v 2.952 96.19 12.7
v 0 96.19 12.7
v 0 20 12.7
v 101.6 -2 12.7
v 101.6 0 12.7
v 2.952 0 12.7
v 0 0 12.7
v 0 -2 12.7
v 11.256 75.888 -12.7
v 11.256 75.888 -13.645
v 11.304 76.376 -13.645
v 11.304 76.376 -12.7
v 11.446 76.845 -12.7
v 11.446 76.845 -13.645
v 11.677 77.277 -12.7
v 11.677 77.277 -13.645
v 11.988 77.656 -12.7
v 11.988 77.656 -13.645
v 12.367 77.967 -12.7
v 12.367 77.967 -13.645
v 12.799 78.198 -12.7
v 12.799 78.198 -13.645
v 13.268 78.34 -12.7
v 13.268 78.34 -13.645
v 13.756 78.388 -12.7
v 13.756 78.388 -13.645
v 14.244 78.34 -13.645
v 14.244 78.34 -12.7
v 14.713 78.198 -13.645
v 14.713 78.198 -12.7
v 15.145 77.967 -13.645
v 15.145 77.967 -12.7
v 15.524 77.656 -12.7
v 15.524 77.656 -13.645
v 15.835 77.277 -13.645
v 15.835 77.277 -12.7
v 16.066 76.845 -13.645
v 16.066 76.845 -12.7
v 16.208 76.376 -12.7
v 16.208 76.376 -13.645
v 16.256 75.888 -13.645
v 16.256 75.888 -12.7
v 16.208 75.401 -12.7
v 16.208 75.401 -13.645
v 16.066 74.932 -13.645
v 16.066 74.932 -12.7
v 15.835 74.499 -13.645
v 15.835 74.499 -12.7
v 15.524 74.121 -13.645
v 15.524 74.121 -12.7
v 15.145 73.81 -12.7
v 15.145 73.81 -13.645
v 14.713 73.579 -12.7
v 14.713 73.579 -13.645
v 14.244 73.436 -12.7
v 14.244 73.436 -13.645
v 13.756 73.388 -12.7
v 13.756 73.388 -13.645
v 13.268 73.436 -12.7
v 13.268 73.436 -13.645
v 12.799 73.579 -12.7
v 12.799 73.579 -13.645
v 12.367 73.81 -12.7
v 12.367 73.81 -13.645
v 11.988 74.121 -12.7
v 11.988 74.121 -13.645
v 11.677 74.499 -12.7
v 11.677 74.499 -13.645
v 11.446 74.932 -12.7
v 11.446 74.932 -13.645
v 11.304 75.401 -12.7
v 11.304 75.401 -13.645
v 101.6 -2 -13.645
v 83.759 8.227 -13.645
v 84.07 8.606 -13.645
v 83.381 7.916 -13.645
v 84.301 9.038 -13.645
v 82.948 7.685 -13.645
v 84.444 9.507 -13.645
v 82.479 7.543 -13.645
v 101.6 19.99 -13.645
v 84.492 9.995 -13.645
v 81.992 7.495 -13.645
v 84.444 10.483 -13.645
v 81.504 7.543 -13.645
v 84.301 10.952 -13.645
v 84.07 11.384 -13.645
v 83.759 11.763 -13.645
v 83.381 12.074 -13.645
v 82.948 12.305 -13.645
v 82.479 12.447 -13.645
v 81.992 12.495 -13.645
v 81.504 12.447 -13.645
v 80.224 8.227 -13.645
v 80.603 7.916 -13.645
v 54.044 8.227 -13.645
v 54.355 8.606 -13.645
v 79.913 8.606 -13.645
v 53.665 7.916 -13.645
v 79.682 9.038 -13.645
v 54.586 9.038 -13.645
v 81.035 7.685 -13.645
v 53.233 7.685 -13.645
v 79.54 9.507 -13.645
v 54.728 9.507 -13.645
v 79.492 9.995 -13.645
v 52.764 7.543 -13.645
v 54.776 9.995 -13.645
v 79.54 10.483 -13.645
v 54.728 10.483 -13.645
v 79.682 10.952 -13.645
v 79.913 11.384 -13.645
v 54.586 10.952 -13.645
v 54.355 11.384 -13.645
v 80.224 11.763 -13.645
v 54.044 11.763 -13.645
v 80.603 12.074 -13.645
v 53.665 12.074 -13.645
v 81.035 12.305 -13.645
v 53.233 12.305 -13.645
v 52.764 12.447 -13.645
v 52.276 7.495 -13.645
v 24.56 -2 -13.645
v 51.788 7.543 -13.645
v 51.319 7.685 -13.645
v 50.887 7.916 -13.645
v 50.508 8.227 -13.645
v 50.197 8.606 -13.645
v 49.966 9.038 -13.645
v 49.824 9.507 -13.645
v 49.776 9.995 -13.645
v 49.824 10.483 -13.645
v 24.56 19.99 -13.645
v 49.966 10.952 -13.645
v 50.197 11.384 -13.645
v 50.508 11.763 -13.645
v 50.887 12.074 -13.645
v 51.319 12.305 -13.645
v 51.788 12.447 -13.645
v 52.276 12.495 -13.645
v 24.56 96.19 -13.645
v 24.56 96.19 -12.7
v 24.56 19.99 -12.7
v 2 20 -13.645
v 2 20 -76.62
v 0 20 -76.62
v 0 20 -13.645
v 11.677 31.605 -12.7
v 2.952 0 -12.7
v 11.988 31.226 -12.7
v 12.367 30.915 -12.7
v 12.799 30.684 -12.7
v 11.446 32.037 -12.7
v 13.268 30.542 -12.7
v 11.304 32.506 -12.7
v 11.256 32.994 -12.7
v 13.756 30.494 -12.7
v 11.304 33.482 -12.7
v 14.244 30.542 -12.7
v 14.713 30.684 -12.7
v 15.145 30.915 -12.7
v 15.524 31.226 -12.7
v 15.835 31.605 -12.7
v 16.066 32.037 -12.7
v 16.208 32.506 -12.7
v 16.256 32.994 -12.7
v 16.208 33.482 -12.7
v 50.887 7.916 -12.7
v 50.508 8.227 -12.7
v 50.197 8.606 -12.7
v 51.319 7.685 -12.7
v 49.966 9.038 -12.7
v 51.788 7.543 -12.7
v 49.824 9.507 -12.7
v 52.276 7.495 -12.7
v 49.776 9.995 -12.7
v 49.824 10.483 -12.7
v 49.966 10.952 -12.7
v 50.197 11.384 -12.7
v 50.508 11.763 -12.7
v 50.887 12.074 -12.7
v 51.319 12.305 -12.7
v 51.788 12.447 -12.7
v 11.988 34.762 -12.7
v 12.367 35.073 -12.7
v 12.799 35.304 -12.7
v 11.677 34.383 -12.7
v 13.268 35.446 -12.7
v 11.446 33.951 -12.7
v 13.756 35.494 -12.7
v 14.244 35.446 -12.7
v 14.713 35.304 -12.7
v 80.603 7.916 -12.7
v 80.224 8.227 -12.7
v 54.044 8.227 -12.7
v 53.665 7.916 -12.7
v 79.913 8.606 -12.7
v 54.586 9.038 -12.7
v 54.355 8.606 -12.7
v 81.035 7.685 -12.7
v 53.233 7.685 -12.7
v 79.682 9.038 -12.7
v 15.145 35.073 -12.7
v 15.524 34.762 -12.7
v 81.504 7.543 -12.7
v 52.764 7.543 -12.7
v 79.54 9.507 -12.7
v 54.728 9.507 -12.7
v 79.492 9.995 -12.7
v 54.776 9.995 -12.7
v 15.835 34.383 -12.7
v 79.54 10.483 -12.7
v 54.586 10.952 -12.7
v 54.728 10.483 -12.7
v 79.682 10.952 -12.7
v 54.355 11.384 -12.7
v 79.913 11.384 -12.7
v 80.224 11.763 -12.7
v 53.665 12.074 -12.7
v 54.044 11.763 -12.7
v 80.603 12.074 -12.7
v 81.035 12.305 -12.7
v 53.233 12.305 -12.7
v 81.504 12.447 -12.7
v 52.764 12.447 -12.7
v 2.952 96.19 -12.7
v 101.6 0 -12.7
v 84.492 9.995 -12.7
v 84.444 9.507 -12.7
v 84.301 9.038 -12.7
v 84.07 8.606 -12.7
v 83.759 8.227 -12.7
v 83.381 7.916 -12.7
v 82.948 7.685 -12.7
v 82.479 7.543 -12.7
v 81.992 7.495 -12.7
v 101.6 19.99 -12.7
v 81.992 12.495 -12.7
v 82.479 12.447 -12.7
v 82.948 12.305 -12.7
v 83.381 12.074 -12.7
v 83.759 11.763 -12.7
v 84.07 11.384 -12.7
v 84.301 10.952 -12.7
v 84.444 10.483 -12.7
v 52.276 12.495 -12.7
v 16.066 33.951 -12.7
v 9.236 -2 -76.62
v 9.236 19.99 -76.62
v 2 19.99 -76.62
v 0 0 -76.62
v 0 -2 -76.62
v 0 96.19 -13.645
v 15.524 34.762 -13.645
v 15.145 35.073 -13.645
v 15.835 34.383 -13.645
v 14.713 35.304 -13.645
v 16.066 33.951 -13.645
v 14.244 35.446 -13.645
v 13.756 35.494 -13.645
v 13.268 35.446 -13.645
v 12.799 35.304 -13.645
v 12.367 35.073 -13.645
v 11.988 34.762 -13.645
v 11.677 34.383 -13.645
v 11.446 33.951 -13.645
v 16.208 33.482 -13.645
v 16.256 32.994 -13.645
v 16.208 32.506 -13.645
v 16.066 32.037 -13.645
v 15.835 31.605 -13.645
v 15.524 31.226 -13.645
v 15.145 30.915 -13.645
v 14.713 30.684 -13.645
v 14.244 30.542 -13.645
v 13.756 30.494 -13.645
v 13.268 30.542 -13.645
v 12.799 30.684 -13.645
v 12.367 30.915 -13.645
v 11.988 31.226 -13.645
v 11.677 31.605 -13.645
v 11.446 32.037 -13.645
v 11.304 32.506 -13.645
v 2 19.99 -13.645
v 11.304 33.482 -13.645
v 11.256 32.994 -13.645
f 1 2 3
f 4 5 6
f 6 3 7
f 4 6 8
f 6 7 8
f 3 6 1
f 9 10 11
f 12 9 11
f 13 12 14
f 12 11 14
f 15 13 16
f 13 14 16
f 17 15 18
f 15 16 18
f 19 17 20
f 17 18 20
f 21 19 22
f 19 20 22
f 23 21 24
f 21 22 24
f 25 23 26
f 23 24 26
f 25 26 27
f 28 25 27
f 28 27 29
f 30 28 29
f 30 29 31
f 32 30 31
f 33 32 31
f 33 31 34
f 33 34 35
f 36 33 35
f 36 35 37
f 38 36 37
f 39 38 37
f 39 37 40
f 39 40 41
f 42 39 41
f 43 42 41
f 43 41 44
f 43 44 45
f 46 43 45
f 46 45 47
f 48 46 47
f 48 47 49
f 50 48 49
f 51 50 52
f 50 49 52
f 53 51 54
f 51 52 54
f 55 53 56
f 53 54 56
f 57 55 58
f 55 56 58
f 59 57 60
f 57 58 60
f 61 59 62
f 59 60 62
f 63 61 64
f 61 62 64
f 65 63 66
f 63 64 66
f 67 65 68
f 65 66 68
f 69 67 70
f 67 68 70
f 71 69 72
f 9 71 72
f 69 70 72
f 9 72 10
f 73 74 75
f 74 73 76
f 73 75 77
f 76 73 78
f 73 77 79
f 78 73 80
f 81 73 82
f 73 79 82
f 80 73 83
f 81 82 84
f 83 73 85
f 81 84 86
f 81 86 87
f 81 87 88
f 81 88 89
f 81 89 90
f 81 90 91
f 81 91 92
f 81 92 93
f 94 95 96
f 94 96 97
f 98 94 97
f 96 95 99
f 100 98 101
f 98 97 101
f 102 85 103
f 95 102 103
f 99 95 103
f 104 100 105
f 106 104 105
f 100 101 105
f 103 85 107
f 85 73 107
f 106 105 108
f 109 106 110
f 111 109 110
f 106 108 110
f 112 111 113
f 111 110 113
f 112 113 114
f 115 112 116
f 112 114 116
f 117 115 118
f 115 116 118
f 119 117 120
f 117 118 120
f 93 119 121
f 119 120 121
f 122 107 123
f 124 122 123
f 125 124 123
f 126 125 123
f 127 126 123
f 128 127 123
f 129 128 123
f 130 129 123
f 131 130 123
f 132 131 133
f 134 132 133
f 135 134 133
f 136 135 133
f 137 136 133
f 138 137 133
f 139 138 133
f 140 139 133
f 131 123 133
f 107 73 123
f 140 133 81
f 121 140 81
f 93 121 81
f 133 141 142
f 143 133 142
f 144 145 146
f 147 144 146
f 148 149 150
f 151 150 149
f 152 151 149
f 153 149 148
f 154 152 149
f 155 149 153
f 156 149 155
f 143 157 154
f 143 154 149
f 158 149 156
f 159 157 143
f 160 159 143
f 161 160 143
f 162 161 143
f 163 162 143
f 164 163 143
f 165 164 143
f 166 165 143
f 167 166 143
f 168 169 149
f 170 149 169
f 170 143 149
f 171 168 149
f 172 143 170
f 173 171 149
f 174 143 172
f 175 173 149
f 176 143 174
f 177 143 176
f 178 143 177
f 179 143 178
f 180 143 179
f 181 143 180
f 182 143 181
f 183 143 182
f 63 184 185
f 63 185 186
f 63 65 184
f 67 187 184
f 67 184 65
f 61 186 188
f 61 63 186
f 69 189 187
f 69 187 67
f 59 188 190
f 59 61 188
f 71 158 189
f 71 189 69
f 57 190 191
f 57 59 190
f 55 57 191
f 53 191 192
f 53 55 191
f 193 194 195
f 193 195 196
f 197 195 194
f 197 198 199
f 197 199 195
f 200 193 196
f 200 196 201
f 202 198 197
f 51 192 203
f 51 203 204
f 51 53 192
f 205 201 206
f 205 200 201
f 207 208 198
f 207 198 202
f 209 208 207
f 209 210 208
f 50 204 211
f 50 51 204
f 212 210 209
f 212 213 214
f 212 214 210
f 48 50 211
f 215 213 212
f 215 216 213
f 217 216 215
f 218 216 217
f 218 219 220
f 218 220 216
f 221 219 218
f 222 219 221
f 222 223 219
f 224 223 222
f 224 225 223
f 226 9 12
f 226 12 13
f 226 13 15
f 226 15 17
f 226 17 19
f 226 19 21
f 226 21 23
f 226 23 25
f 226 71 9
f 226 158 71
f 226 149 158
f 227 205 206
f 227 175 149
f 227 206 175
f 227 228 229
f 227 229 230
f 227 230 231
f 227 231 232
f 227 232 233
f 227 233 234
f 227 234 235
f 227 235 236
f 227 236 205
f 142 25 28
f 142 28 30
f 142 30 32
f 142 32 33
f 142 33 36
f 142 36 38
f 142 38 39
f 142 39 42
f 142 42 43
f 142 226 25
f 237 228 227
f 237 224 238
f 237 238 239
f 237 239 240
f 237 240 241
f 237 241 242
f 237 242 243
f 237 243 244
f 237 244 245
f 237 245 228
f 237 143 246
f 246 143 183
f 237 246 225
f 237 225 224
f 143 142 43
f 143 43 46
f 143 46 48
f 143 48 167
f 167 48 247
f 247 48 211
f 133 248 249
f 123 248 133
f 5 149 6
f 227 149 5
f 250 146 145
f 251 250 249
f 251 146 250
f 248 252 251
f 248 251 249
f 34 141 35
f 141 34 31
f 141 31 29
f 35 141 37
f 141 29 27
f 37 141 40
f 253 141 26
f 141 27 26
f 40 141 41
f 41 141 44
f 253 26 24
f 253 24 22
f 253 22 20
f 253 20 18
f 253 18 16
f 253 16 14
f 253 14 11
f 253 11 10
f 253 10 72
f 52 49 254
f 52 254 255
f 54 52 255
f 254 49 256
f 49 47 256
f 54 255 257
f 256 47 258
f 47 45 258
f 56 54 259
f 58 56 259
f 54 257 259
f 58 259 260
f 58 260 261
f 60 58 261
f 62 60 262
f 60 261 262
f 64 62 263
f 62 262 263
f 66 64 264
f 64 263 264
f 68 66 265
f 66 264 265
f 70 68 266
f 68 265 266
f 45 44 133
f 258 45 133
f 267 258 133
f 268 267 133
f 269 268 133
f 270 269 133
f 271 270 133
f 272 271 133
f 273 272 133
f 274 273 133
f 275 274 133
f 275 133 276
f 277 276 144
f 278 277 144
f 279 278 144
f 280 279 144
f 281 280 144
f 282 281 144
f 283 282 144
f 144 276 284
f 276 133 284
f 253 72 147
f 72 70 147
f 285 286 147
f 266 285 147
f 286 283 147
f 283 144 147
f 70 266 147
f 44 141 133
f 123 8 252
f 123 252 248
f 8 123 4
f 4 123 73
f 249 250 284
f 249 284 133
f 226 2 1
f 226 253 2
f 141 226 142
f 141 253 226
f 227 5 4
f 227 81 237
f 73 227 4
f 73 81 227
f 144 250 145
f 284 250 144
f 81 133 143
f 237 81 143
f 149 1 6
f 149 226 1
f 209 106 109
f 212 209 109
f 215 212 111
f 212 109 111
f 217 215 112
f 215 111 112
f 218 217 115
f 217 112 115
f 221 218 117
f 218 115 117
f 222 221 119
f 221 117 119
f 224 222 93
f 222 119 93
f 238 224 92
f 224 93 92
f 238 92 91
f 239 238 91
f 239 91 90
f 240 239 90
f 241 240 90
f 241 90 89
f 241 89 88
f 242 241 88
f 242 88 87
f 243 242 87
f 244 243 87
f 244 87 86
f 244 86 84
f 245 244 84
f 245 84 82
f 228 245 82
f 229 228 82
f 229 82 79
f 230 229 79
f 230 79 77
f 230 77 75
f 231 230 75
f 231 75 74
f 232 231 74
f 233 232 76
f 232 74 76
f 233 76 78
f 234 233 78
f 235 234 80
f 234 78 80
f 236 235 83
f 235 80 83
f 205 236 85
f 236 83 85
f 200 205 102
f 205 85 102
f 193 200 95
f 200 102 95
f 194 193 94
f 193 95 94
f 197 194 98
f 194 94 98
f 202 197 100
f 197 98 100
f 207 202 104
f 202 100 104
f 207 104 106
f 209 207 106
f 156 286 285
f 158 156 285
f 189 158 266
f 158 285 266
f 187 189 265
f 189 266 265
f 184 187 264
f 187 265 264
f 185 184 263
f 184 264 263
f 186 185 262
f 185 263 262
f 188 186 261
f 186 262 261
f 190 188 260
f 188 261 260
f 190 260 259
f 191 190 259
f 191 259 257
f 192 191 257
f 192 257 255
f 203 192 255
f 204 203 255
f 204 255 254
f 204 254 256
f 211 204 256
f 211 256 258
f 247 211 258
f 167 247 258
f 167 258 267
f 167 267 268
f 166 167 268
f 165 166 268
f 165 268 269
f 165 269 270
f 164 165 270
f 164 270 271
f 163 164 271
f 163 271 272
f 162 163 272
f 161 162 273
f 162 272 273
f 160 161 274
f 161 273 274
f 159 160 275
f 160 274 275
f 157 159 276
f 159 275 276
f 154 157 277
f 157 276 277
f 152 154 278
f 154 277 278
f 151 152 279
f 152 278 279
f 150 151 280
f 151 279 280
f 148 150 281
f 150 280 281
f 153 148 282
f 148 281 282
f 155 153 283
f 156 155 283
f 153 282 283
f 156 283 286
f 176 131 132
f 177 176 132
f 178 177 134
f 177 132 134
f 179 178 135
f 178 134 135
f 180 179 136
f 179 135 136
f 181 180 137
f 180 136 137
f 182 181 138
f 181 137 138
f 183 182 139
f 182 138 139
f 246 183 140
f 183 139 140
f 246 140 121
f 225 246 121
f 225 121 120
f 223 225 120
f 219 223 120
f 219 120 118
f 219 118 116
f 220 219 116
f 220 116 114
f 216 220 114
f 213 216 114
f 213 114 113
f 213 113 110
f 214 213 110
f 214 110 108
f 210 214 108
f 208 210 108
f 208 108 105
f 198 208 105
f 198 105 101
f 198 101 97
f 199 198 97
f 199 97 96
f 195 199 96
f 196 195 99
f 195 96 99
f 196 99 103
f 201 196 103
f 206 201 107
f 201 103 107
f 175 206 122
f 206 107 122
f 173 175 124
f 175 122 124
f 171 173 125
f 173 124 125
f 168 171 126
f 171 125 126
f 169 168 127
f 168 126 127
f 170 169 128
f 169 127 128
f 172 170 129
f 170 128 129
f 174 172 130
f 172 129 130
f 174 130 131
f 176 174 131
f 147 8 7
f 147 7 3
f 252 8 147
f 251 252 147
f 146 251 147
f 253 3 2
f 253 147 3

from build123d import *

# Parameters (mm, degrees)
F1_DEPTH  = 2
F2_W      = 2
F2_H      = 76.6198585529
F3_DEPTH  = 20
F4_DEPTH  = 19.9898
F5_W      = 22.560308024
F5_H      = 13.6446189195
F5_W_2    = 2
F6_DEPTH  = 76.2
F7_DEPTH  = 25.4
F9_DEPTH  = 12.7
F10_DEPTH = 12.7
F12_D     = 5


with BuildPart() as f1:
    # F0 (on Front) → F1 (new body)
    with BuildSketch(Plane.XZ):
        Polygon((76.2, 0), (0, 0), (0, -76.6198585529), (9.2363302823, -76.6198585529), (24.560308024, -13.6446189195), (76.2, -13.6446189195), align=None)
    extrude(amount=F1_DEPTH)

    # F2 (on face) → F3 (join)
    with BuildSketch(Plane(origin=(0, 0, 0), x_dir=(-1, 0, 0), z_dir=(0, 1, 0))):
        with Locations((-1, -38.3099292764)):
            Rectangle(F2_W, F2_H)
    extrude(amount=F3_DEPTH)

    # F4 (add): a face of the model
    f4_faces = [f1.faces().sort_by_distance(p)[0] for p in [
        (15.8619650851, 0, -44.8800592008),
    ]]
    extrude(f4_faces, amount=F4_DEPTH)

    # F5 (on face) → F6 (join)
    with BuildSketch(Plane(origin=(0, 19.9898, 0), x_dir=(-1, 0, 0), z_dir=(0, 1, 0))):
        with Locations((-13.280154012, -6.8223094598)):
            Rectangle(F5_W, F5_H)
        with Locations((-1, -6.8223094598)):
            Rectangle(F5_W_2, F5_H)
    extrude(amount=F6_DEPTH)

    # F7 (add): a face of the model
    f7_faces = [f1.faces().sort_by_distance(p)[0] for p in [
        (76.2, 8.9949, -6.8223094598),
    ]]
    extrude(f7_faces, amount=F7_DEPTH)

    # F8 (on face) → F9 (cut)
    with BuildSketch(Plane.XY):
        Polygon((2.9516927898, 0), (101.6, 0), (101.6, 19.9898), (24.560308024, 19.9898), (24.560308024, 96.1898), (2.9516927898, 96.1898), align=None)
    extrude(amount=-F9_DEPTH, mode=Mode.SUBTRACT)

    # F10 (add): a face of the model
    f10_faces = [f1.faces().sort_by_distance(p)[0] for p in [
        (1.412933007, 47.0949, 0),
    ]]
    extrude(f10_faces, amount=F10_DEPTH)

    # F12 (through all)
    with Locations(Plane.XY.offset(-12.7)):
        with Locations((81.9915756583, 9.9949), (52.2758463949, 9.9949), (13.7560004069, 32.9941399395), (13.7560004069, 75.88840276)):
            Hole(F12_D / 2)


solid = f1.part
